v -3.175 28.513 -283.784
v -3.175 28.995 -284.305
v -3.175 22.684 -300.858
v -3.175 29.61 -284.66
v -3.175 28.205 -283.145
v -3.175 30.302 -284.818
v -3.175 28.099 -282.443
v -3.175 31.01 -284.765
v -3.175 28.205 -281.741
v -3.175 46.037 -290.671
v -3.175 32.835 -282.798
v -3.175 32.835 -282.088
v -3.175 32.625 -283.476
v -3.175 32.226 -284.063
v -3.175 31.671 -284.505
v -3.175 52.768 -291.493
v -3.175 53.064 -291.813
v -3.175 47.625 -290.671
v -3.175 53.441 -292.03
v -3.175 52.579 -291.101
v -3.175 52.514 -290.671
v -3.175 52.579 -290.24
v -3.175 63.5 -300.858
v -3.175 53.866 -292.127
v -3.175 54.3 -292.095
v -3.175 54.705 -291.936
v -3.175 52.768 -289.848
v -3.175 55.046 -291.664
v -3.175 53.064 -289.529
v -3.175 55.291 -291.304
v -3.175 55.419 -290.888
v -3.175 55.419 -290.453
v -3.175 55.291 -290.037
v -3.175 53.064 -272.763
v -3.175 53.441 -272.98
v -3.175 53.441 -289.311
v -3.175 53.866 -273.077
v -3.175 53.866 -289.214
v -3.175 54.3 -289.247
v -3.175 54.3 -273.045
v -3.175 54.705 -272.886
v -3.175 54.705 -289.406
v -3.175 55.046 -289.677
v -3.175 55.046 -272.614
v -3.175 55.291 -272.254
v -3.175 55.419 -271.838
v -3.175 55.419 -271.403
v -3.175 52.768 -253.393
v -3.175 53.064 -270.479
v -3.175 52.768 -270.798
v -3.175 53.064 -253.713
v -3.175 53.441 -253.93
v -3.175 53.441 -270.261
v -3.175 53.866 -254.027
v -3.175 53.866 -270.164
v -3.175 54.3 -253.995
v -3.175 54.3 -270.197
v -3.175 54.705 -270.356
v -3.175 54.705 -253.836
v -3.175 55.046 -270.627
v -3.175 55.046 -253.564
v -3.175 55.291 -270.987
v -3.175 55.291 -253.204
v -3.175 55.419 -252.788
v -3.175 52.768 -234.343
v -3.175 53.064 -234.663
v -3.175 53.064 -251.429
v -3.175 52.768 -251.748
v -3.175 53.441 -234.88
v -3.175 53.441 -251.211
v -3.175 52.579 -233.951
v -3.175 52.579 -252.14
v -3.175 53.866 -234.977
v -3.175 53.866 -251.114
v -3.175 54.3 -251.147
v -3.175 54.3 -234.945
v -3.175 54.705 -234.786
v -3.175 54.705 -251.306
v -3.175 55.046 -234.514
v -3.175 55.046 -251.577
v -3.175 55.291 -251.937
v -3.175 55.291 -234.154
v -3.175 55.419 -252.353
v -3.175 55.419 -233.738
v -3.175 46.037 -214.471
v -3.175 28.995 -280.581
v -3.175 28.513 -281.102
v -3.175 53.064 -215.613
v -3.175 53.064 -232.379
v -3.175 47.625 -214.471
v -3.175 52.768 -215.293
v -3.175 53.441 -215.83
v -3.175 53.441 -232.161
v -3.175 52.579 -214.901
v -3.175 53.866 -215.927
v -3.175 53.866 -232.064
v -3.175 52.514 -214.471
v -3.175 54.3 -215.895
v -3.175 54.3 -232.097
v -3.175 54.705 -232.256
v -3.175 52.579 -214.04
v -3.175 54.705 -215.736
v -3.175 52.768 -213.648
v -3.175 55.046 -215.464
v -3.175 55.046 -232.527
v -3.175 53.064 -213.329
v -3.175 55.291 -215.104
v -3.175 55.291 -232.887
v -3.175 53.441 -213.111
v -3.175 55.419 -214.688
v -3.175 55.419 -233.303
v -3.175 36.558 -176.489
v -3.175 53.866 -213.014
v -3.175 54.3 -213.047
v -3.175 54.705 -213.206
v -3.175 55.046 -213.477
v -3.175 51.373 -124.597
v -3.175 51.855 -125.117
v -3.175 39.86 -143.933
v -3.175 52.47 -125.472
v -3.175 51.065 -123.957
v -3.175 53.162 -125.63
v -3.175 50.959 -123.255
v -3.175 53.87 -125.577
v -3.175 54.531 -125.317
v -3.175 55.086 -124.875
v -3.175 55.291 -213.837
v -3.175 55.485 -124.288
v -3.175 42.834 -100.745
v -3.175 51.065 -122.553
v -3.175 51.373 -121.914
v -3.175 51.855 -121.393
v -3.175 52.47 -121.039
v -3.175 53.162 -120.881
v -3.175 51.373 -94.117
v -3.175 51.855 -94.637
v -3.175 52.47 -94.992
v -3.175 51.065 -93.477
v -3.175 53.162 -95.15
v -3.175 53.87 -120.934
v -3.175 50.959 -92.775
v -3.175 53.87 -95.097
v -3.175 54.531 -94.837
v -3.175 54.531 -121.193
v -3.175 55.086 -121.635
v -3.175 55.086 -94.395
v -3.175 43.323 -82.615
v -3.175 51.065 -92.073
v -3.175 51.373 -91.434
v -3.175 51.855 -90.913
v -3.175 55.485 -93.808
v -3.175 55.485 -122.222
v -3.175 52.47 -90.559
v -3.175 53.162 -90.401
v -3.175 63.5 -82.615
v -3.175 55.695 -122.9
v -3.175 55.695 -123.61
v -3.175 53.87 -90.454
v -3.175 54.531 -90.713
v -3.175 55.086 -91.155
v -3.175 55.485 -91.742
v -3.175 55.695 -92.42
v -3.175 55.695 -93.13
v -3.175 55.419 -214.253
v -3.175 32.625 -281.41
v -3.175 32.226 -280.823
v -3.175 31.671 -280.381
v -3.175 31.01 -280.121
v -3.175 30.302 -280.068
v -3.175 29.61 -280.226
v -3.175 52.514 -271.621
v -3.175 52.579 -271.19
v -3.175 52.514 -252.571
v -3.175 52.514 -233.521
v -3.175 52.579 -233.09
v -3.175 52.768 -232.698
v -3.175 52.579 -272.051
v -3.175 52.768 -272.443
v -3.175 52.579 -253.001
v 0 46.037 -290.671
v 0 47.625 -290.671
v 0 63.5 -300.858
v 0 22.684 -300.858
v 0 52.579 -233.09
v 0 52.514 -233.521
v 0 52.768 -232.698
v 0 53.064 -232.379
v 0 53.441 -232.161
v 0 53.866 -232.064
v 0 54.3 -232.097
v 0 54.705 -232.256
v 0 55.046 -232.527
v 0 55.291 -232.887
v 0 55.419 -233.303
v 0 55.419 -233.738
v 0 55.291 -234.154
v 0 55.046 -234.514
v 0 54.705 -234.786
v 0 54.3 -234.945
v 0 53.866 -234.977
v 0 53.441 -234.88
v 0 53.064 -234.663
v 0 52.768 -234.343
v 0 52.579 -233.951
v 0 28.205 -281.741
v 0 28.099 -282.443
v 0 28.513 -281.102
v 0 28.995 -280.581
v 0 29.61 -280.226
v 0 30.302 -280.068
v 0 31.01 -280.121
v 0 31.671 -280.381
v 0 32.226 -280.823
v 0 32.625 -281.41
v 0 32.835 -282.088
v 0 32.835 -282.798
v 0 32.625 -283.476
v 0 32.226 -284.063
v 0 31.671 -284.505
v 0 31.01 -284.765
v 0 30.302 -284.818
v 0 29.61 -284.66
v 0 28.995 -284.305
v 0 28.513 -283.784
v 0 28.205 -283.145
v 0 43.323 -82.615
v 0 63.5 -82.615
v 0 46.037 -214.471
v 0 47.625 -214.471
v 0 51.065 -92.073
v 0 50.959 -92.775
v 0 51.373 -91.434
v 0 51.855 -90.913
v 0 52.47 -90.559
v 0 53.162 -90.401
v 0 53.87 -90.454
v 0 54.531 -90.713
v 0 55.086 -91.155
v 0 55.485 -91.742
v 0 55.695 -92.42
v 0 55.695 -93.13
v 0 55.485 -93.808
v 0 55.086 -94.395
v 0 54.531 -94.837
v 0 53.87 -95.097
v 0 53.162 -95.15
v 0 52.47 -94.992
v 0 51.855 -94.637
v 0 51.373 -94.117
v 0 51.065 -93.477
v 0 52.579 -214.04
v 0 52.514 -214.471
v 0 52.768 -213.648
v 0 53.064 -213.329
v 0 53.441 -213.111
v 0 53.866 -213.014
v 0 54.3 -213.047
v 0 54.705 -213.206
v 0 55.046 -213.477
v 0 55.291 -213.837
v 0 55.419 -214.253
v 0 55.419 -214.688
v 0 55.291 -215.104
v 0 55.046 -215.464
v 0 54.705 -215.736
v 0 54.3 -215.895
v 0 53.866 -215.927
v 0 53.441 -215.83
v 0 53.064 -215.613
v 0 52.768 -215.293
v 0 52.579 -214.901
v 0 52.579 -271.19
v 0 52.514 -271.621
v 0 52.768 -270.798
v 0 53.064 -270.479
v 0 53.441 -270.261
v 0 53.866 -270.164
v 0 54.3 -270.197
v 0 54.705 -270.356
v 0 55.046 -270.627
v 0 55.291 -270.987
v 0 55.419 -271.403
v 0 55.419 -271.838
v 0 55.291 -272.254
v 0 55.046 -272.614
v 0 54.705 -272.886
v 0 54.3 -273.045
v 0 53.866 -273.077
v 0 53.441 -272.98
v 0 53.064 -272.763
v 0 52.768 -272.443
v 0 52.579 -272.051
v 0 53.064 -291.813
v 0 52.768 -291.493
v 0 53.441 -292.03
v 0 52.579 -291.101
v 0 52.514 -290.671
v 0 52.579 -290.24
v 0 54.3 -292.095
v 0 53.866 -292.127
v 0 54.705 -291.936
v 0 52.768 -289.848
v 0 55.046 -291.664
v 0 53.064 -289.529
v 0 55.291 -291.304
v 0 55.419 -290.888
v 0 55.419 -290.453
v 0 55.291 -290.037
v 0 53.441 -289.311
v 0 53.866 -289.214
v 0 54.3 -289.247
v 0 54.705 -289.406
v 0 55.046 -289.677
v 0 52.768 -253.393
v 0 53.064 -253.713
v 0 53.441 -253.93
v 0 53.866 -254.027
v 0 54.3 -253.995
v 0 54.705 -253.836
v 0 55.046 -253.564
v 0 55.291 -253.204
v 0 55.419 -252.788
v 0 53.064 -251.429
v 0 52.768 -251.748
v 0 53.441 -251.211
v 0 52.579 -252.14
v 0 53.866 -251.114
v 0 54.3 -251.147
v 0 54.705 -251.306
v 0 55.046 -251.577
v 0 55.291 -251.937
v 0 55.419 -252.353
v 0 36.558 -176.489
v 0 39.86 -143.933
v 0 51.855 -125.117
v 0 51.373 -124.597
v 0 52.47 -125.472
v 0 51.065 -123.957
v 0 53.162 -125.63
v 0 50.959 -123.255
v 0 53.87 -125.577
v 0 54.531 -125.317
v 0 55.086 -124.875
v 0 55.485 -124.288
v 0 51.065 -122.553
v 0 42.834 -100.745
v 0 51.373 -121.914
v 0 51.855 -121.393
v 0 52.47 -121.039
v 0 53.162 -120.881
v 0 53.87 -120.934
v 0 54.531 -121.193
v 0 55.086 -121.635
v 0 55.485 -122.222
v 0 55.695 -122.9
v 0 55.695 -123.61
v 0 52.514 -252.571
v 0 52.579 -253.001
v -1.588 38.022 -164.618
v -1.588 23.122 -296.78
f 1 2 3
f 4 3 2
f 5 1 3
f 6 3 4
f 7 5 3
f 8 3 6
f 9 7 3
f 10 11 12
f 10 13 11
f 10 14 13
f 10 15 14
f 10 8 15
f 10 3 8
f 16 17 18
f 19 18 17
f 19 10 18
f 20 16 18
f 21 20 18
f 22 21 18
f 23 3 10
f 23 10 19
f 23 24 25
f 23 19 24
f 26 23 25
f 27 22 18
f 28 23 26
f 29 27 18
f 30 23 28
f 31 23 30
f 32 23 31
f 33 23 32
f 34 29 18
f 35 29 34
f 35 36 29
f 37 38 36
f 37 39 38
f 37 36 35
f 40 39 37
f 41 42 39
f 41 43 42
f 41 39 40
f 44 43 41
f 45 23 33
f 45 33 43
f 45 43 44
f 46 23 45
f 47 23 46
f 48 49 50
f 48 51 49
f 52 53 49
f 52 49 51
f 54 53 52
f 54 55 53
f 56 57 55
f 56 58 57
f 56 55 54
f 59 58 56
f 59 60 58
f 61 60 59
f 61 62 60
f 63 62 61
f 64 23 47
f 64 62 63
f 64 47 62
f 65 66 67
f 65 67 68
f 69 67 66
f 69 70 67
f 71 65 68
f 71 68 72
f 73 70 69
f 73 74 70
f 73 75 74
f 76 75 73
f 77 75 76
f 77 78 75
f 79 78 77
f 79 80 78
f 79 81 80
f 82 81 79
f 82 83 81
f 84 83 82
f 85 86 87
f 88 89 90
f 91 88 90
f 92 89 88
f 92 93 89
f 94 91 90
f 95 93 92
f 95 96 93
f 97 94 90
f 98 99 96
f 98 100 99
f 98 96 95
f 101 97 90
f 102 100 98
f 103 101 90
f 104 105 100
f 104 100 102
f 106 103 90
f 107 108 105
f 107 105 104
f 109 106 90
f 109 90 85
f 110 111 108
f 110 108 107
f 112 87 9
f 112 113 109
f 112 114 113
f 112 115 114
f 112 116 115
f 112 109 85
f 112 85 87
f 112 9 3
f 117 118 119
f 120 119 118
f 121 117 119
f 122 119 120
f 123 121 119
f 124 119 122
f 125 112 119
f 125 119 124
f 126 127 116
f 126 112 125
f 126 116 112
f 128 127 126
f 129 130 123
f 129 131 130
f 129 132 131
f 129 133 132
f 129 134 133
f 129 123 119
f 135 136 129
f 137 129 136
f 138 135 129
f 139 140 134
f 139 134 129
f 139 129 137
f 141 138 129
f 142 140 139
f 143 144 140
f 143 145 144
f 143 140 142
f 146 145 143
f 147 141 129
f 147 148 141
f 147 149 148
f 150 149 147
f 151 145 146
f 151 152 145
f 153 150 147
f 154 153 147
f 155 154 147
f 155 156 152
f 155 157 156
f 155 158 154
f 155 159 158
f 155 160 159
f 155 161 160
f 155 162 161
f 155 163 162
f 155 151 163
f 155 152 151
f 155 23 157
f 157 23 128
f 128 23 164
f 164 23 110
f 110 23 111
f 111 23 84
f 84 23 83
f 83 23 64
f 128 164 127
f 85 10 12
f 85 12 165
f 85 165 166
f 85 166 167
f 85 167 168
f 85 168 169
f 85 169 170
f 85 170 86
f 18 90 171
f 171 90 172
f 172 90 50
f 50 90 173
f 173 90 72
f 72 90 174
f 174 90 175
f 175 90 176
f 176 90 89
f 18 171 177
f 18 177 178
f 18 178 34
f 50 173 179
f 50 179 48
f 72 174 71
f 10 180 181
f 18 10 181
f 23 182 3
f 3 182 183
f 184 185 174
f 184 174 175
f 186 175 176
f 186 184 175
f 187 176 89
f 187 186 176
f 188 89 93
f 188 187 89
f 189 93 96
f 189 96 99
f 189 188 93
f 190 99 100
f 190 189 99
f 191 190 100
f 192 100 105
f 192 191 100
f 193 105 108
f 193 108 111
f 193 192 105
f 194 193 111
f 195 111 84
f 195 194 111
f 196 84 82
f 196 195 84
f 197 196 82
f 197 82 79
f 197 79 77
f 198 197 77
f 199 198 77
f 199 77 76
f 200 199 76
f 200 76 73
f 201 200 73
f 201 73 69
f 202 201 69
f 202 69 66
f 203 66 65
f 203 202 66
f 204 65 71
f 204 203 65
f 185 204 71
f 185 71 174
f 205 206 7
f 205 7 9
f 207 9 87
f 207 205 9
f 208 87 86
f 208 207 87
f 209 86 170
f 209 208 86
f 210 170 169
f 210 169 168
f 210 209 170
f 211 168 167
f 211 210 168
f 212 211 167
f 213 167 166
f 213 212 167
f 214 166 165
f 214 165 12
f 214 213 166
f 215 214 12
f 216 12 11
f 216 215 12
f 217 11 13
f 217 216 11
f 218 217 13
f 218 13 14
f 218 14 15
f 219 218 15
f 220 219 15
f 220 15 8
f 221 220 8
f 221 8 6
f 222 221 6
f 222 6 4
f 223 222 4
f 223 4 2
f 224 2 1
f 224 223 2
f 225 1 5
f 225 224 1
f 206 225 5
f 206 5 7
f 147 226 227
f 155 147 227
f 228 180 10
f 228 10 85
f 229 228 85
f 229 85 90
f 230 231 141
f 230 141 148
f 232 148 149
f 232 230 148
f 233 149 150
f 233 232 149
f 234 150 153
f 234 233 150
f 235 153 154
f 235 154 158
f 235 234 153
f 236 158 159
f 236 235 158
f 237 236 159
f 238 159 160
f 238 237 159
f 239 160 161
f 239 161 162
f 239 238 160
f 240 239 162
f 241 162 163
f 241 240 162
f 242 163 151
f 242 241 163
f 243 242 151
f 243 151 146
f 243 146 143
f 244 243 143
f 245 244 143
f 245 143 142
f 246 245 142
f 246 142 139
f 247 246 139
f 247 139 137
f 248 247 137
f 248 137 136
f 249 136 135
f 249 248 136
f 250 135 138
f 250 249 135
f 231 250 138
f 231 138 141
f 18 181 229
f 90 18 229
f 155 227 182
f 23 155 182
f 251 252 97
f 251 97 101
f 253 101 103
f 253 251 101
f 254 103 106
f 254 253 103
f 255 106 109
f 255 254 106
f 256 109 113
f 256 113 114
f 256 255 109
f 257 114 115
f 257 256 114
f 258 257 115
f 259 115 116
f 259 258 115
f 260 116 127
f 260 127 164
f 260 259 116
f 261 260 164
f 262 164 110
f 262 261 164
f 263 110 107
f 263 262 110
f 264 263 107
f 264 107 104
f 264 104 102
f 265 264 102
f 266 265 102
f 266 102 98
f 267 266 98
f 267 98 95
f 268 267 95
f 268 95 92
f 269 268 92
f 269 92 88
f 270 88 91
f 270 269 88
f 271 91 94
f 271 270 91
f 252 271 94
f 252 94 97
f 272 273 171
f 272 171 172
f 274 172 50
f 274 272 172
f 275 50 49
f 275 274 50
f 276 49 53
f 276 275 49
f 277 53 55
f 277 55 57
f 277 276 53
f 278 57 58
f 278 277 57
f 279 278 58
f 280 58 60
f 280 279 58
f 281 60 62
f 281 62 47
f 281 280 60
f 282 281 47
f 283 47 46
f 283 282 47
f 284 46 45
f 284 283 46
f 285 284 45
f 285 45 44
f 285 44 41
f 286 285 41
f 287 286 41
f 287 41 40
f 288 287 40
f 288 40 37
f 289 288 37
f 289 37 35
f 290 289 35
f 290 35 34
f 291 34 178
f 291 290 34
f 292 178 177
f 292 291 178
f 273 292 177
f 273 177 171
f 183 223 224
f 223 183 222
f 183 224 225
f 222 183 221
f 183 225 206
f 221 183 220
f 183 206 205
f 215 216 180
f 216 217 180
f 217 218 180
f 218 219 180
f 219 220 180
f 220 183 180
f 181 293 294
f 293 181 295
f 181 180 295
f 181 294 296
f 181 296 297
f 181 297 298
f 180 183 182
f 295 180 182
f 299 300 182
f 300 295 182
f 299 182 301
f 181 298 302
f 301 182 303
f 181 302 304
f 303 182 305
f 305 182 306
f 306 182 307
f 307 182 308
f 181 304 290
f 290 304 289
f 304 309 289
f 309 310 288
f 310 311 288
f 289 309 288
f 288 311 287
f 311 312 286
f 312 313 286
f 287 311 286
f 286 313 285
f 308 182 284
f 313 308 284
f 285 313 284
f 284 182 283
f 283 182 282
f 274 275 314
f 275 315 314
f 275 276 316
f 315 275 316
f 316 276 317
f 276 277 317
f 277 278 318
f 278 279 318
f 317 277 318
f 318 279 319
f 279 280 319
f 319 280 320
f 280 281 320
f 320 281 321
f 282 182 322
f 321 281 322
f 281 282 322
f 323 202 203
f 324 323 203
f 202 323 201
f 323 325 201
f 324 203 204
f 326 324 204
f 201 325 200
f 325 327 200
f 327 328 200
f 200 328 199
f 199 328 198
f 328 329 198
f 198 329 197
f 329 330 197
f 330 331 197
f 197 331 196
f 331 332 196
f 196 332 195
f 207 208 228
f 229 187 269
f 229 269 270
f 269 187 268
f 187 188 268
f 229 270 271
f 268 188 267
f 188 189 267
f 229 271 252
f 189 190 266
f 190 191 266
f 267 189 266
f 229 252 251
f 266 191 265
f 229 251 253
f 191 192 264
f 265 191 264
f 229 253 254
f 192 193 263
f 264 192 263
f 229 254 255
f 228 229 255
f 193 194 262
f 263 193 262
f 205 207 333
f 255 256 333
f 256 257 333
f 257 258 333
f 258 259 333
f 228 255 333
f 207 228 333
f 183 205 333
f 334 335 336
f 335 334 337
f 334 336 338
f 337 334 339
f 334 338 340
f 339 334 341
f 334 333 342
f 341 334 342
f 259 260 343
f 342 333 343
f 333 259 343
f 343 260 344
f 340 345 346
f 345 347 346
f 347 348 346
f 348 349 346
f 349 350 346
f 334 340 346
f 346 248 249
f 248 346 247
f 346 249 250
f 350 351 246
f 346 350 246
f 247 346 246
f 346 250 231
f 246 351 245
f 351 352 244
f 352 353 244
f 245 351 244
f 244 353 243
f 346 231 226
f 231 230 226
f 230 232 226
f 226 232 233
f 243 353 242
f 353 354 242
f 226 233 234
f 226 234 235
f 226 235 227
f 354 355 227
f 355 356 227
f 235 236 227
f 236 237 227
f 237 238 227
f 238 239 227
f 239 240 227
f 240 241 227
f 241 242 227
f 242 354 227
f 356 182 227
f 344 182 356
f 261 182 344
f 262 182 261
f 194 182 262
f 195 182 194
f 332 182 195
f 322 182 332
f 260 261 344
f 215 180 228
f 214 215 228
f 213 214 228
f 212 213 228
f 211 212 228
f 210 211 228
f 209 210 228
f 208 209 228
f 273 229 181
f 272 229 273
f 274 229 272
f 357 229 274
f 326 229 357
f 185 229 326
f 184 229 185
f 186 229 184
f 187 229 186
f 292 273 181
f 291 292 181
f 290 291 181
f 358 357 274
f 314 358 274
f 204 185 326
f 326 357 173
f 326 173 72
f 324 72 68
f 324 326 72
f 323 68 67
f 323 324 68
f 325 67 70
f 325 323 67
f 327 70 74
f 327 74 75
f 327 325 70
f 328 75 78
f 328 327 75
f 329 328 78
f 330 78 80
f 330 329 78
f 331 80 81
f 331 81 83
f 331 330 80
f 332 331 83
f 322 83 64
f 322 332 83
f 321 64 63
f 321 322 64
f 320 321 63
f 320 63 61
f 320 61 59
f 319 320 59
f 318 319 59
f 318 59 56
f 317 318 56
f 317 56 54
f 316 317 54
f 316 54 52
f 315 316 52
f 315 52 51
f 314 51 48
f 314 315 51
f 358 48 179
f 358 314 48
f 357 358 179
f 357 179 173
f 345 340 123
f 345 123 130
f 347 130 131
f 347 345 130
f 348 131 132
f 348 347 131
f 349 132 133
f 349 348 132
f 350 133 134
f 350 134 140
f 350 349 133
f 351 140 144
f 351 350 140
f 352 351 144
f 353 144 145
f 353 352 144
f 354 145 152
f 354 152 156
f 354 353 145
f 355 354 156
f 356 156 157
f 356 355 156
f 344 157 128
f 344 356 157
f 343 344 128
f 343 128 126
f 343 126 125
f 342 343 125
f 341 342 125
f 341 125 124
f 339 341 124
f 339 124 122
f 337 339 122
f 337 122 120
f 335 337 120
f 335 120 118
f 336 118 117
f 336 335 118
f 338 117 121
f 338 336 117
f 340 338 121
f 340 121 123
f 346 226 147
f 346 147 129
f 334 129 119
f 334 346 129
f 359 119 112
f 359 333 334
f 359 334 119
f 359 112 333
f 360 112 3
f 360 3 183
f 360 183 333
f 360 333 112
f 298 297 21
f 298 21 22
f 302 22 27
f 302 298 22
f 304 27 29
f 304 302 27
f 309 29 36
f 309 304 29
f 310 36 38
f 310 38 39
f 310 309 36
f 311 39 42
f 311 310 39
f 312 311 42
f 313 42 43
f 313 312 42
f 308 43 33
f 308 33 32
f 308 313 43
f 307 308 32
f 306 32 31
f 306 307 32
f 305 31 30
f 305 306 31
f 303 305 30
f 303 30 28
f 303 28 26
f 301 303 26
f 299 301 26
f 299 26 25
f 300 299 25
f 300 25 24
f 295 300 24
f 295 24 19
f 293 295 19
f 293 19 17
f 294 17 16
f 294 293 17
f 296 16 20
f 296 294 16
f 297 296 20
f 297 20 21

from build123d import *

# Parameters (mm, degrees)
SKETCH1_R           = 1.4605
SKETCH1_R_2         = 2.38125
SKETCH1_W           = 76.2
SKETCH1_H           = 1.5875
BOSS_EXTRUDE1_DEPTH = 3.175


with BuildPart() as part:
    # Sketch1 → Boss-Extrude1 (new body)
    with BuildSketch(Plane(origin=(0, 0, -187.325), x_dir=(0, 0, 1), z_dir=(-1, 0, 0))):
        with BuildLine():
            Line((104.70984031, 63.5), (-113.533003978, 63.5))
            Line((-113.533003978, 63.5), (-113.533003978, 22.683614274))
            add(Edge.make_bspline(
                [(104.70984031, 43.322928246), (97.292428523, 43.369222767), (86.485562122, 42.947747635), (59.066875535, 40.734135472), (33.287431115, 39.5878223), (-16.446460986, 32.848239562), (-71.701017552, 27.184558545), (-112.180029797, 22.829441378), (-113.533003978, 22.683614274)],
                knots=[0.290535466, 0.290535466, 0.290535466, 0.290535466, 0.346598052, 0.372016829, 0.495604882, 0.537891493, 0.752596324, 0.760056632, 0.760056632, 0.760056632, 0.760056632], degree=3))
            Line((104.70984031, 43.322928246), (104.70984031, 63.5))
        make_face()
        with Locations(Location((-84.295733083, 53.975, 0), (0, 0, 270))):
            Circle(SKETCH1_R, mode=Mode.SUBTRACT)
        with Locations(Location((-46.195733083, 53.975, 0), (0, 0, 270))):
            Circle(SKETCH1_R, mode=Mode.SUBTRACT)
        with Locations(Location((-27.145733083, 53.975, 0), (0, 0, 270))):
            Circle(SKETCH1_R, mode=Mode.SUBTRACT)
        with Locations(Location((64.06984031, 53.34, 0), (0, 0, 270))):
            Circle(SKETCH1_R_2, mode=Mode.SUBTRACT)
        with Locations(Location((94.54984031, 53.34, 0), (0, 0, 270))):
            Circle(SKETCH1_R_2, mode=Mode.SUBTRACT)
        with Locations(Location((-103.345733083, 53.975, 0), (0, 0, 270))):
            Circle(SKETCH1_R, mode=Mode.SUBTRACT)
        with Locations(Location((-95.118003978, 30.48, 0), (0, 0, 270))):
            Circle(SKETCH1_R_2, mode=Mode.SUBTRACT)
        with Locations(Location((-65.245733083, 53.975, 0), (0, 0, 270))):
            Circle(SKETCH1_R, mode=Mode.SUBTRACT)
        with Locations((-65.245733083, 46.83125)):
            Rectangle(SKETCH1_W, SKETCH1_H, mode=Mode.SUBTRACT)
    extrude(amount=BOSS_EXTRUDE1_DEPTH)


solid = part.part
